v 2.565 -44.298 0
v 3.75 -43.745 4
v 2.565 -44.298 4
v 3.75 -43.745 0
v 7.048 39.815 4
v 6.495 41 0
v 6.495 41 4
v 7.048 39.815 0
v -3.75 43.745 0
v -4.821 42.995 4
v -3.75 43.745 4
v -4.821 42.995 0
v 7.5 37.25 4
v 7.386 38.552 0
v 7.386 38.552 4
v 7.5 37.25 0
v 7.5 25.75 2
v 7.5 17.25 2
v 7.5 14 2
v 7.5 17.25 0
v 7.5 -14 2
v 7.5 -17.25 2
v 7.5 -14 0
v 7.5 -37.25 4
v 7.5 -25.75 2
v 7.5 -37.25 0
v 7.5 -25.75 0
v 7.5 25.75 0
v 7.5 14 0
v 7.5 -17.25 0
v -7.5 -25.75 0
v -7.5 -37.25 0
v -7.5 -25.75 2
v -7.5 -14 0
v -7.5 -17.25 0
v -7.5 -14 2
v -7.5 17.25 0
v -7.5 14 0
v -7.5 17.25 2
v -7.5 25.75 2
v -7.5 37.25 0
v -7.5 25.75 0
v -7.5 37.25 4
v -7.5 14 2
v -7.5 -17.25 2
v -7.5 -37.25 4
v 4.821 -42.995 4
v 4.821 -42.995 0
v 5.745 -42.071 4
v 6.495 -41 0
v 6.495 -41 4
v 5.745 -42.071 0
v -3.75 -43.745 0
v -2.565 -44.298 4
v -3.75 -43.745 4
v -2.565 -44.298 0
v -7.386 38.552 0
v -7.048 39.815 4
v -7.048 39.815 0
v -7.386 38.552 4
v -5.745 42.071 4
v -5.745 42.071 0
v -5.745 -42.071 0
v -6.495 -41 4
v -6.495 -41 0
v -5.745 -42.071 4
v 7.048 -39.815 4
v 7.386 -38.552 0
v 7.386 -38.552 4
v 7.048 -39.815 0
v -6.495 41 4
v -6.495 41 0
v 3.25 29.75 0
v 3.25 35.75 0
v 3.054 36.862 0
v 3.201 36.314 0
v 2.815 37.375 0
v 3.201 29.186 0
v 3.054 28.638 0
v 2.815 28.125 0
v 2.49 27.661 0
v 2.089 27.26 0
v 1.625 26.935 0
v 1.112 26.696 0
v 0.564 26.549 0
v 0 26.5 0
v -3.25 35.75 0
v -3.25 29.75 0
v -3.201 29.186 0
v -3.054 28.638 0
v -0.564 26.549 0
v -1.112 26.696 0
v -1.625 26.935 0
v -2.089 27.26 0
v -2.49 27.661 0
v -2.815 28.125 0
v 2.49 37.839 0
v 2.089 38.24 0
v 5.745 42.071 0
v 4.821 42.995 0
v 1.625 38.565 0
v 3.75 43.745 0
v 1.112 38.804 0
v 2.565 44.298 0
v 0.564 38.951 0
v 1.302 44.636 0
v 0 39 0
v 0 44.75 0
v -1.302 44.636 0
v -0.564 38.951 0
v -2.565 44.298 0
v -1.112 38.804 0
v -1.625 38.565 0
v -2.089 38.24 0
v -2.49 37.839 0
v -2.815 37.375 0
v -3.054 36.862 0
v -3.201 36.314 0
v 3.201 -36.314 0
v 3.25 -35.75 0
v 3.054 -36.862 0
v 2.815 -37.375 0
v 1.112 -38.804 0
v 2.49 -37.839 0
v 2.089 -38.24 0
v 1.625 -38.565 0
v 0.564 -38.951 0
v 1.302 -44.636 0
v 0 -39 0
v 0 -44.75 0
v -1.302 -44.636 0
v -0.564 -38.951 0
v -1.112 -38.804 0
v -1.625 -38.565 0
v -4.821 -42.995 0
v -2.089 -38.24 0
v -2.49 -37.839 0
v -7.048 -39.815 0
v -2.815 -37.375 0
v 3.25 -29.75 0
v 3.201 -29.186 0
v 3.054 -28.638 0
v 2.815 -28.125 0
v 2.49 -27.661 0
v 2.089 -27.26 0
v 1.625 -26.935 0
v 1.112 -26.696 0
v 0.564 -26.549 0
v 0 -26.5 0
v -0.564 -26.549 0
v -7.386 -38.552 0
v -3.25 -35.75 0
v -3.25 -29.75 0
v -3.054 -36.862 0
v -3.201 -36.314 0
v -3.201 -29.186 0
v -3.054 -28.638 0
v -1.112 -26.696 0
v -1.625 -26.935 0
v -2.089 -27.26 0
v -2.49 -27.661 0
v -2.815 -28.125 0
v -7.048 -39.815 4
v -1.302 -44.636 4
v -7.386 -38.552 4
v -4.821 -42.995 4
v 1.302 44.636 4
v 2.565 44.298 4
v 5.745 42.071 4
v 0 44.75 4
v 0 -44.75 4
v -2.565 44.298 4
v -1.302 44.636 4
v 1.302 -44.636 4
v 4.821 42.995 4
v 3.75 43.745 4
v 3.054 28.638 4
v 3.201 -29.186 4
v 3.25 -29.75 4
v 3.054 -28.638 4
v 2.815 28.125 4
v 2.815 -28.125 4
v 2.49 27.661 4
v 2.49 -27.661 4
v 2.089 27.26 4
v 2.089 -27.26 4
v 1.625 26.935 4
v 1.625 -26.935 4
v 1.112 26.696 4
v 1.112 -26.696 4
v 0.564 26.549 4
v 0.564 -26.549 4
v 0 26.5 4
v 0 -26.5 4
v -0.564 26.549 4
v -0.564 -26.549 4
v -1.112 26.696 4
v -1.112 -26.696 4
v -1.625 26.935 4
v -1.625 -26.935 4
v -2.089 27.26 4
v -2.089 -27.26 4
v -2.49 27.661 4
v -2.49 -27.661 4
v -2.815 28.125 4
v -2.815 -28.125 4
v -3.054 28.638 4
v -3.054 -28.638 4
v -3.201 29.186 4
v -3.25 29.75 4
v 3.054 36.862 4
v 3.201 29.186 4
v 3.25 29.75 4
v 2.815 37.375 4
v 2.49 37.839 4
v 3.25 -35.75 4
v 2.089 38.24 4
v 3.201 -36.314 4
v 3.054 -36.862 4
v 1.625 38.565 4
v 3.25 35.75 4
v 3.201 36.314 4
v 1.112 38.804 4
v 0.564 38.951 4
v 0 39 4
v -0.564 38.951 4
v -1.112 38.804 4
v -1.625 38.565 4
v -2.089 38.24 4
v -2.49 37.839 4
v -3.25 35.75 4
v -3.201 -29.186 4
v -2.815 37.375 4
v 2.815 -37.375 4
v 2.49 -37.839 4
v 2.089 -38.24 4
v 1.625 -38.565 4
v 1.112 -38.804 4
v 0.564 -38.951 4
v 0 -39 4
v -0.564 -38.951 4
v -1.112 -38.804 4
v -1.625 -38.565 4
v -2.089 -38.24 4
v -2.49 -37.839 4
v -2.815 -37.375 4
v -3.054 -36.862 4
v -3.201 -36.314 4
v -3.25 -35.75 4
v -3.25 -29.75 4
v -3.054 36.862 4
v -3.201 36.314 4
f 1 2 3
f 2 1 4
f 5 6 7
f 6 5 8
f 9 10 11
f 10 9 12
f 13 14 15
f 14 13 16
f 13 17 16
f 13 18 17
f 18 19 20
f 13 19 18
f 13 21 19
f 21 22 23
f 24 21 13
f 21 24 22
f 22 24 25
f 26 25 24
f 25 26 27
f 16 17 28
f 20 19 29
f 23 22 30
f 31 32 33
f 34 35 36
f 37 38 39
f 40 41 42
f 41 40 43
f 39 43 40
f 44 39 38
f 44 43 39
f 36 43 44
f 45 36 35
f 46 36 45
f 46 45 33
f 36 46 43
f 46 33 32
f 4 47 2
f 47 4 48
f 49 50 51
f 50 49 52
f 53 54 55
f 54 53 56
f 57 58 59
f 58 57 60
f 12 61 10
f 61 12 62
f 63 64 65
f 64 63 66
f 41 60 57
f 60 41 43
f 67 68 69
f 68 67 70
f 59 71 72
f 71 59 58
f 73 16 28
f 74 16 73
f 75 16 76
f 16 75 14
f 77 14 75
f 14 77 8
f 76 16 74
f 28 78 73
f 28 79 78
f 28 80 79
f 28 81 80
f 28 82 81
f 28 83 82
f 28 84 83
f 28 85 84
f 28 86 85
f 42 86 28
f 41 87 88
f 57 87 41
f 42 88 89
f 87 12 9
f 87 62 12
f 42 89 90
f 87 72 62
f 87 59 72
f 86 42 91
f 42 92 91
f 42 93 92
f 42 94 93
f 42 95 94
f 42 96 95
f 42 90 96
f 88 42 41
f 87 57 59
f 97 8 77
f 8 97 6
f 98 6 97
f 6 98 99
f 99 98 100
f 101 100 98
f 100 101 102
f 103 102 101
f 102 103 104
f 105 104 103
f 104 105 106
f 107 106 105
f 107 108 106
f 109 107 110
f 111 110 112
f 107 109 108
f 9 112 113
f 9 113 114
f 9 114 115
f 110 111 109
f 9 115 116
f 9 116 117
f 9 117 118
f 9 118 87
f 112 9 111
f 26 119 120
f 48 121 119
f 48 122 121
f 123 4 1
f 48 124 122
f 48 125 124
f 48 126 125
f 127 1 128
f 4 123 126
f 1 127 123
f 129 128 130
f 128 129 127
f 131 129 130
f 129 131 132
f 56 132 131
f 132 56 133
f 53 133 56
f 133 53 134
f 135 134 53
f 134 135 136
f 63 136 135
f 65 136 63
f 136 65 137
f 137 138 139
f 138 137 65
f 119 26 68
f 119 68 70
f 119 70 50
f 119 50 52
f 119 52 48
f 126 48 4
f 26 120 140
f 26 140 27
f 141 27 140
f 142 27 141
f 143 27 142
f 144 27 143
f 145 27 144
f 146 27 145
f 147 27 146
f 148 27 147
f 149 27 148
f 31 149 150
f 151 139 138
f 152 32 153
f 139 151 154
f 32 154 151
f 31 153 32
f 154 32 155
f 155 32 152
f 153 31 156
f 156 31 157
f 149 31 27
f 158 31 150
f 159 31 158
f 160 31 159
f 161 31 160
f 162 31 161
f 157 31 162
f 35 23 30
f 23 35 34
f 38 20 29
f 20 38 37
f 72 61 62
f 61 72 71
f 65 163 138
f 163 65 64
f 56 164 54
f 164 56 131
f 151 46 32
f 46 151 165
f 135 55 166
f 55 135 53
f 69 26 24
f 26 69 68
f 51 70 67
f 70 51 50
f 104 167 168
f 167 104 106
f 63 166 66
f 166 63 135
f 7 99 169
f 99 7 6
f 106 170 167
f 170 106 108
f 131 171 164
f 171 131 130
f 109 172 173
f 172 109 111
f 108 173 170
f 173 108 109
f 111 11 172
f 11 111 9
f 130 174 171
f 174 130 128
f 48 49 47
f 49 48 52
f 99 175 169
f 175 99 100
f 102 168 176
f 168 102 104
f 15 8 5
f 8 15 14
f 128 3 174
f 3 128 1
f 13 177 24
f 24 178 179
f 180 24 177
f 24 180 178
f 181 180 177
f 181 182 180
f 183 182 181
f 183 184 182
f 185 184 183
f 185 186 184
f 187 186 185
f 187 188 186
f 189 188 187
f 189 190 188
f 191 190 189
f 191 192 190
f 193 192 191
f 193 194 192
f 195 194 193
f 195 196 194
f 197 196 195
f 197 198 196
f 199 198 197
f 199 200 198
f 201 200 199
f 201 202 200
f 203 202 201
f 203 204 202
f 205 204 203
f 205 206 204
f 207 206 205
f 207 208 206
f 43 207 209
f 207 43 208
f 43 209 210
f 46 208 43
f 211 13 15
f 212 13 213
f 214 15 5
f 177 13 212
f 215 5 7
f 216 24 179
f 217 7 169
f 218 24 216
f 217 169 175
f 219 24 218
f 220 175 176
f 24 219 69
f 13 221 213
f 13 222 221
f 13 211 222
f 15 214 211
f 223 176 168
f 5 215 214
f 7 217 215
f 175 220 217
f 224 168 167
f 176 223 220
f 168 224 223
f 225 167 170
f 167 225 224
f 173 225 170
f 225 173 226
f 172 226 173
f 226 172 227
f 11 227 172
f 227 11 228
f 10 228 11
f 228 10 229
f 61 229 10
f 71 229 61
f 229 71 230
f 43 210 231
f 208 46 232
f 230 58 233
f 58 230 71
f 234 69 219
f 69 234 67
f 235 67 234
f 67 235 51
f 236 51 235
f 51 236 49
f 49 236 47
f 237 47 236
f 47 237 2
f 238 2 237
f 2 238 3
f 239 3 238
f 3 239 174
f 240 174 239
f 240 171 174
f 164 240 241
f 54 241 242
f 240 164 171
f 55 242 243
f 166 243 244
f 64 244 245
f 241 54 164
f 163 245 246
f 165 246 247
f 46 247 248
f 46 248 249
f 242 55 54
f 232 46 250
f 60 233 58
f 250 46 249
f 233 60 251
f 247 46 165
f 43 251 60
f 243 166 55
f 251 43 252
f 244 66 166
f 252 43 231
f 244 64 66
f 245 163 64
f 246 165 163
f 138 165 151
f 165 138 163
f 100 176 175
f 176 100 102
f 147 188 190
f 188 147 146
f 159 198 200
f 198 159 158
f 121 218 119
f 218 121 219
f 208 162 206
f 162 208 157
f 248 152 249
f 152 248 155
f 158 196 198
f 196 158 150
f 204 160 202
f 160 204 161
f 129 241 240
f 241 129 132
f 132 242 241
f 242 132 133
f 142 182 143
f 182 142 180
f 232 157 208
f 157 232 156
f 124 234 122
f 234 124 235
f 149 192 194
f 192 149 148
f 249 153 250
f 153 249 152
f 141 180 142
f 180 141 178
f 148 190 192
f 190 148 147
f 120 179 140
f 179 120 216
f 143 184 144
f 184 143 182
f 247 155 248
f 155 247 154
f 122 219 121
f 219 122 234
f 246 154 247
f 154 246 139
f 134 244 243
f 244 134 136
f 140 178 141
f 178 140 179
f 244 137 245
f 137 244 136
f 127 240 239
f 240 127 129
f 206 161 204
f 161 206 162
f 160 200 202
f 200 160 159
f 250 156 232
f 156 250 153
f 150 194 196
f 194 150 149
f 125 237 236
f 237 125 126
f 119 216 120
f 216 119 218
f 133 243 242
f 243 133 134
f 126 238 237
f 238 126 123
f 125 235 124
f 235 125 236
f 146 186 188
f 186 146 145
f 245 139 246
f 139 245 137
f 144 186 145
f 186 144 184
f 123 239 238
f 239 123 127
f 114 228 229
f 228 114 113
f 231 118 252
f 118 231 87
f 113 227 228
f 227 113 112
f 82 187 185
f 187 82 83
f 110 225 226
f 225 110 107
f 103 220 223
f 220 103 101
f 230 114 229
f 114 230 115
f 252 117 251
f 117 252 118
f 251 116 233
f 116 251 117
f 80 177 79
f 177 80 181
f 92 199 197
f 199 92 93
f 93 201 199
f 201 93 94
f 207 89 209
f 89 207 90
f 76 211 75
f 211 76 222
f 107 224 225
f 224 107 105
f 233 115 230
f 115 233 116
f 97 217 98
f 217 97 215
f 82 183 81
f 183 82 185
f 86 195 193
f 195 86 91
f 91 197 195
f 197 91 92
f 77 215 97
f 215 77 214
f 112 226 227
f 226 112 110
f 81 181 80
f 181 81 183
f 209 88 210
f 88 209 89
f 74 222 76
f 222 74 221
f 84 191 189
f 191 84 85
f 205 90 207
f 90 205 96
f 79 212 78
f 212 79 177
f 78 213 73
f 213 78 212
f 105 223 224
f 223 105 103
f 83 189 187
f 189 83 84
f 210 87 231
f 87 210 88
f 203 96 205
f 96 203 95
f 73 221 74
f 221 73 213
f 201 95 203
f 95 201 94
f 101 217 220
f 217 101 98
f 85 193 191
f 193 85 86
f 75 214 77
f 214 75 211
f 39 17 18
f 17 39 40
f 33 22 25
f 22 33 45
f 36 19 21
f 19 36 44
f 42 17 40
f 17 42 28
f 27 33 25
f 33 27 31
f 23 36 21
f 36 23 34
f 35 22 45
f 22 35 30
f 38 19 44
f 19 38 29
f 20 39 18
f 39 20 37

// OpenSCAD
// file: rounded_cube.scad
module rounded_cube(size = [ 1, 1, 1 ], center = false, r = 0.5) {
	// if single value, convert to [x, y, z] vector
	size = (size[0] == undef) ? [size, size, size] : size;

	translate = (center == false) ?
		[ r, r, r ] :
		[
			r - (size[0] / 2),
			r - (size[1] / 2),
			r - (size[2] / 2)
        ];

	translate(translate)
	minkowski() {
		cube(size = [
			size[0] - (r * 2),
			size[1] - (r * 2),
			size[2] - (r * 2)
		]);
		sphere(r);
	}
}


module rounded_column(size = [1, 1, 1], center = false, r = 0.5) {
	// if single value, convert to [x, y, z] vector
	size = (size[0] == undef) ? [size, size, size] : size;

    x = size[0] - 2*r;
    y = size[1] - 2*r;
    h = size[2];
    
	translate = (center == false) ?
		[ r, r, 0 ] :
		[
			r - (size[0] / 2),
			r - (size[1] / 2),
			  - h / 2
        ];

	translate(translate)
    hull() {
		translate([ 0, 0, 0 ]) cylinder(r=r, h);
		translate([ x, 0, 0 ]) cylinder(r=r, h);
		translate([ 0, y, 0 ]) cylinder(r=r, h);
		translate([ x, y, 0 ]) cylinder(r=r, h);
	}
}

rounded_cube(20, r=4, center=true);
// main file
use <rounded_cube.scad>

$fn = 36;

// to print upside down

module nema_motor_clamp(
    clamp_width = 15,
    clamp_adjust = 6,
    screw_diam = 6.5,
    support_width = 51.5,
    h = 4.0  // > support_thickness (typ 4.0)
    )
{
    epsilon = 1;
    
    translate([ 0, 0, h/2 ])
    difference()
    {
        R = clamp_width / 2;
        L = support_width + 2*clamp_width + 2*epsilon + clamp_adjust;
        
        rounded_column([ 2*R, L, h ], r=R, center=true);

        r = screw_diam / 2;
        l = 2*r + clamp_adjust;
        y = support_width/2 + clamp_adjust + epsilon;
        
        translate([ 0, -y, 0 ])
        rounded_column([ 2*r, l, h ], r=r, center=true);

        translate([ 0, +y, 0 ])
        rounded_column([ 2*r, l, h ], r=r, center=true);
    }
}

module nema_motor_support(
    support_width = 51.5,     // measured: 50
    support_thickness = 2.5,  // measured: 2.5
    slot_width = 3.25,        // measured: 4
    slot_dist = 31.25,        // measured: 30
    slot_length = 34,
    hole_diameter = 22.5 )
{
    L = support_width;
    h = support_thickness;
    r = 1.5;
    
    l = slot_length;
    w = slot_width;
    
    epsilon = 0.5;
        
    translate([ 0, 0, h/2 - epsilon ])
    difference() {
        cube([ L, L, h ], center=true);
        translate([ 0, -slot_dist/2, 0 ])
            rounded_column([ l, w, h], center=true, r=r);
        translate([ 0, +slot_dist/2, 0 ])
            rounded_column([ l, w, h], center=true, r=r);
    }
    
    translate([ L/2+h/2, 0, L/2 ])
    rotate([ 0, 90, 0 ])
    difference() {
        cube([ L, L, h ], center=true);
        cylinder(r = hole_diameter/2, h = 3*h, center=true);
    }
}

difference() {
    nema_motor_clamp();
    nema_motor_support();
}

%nema_motor_support();
